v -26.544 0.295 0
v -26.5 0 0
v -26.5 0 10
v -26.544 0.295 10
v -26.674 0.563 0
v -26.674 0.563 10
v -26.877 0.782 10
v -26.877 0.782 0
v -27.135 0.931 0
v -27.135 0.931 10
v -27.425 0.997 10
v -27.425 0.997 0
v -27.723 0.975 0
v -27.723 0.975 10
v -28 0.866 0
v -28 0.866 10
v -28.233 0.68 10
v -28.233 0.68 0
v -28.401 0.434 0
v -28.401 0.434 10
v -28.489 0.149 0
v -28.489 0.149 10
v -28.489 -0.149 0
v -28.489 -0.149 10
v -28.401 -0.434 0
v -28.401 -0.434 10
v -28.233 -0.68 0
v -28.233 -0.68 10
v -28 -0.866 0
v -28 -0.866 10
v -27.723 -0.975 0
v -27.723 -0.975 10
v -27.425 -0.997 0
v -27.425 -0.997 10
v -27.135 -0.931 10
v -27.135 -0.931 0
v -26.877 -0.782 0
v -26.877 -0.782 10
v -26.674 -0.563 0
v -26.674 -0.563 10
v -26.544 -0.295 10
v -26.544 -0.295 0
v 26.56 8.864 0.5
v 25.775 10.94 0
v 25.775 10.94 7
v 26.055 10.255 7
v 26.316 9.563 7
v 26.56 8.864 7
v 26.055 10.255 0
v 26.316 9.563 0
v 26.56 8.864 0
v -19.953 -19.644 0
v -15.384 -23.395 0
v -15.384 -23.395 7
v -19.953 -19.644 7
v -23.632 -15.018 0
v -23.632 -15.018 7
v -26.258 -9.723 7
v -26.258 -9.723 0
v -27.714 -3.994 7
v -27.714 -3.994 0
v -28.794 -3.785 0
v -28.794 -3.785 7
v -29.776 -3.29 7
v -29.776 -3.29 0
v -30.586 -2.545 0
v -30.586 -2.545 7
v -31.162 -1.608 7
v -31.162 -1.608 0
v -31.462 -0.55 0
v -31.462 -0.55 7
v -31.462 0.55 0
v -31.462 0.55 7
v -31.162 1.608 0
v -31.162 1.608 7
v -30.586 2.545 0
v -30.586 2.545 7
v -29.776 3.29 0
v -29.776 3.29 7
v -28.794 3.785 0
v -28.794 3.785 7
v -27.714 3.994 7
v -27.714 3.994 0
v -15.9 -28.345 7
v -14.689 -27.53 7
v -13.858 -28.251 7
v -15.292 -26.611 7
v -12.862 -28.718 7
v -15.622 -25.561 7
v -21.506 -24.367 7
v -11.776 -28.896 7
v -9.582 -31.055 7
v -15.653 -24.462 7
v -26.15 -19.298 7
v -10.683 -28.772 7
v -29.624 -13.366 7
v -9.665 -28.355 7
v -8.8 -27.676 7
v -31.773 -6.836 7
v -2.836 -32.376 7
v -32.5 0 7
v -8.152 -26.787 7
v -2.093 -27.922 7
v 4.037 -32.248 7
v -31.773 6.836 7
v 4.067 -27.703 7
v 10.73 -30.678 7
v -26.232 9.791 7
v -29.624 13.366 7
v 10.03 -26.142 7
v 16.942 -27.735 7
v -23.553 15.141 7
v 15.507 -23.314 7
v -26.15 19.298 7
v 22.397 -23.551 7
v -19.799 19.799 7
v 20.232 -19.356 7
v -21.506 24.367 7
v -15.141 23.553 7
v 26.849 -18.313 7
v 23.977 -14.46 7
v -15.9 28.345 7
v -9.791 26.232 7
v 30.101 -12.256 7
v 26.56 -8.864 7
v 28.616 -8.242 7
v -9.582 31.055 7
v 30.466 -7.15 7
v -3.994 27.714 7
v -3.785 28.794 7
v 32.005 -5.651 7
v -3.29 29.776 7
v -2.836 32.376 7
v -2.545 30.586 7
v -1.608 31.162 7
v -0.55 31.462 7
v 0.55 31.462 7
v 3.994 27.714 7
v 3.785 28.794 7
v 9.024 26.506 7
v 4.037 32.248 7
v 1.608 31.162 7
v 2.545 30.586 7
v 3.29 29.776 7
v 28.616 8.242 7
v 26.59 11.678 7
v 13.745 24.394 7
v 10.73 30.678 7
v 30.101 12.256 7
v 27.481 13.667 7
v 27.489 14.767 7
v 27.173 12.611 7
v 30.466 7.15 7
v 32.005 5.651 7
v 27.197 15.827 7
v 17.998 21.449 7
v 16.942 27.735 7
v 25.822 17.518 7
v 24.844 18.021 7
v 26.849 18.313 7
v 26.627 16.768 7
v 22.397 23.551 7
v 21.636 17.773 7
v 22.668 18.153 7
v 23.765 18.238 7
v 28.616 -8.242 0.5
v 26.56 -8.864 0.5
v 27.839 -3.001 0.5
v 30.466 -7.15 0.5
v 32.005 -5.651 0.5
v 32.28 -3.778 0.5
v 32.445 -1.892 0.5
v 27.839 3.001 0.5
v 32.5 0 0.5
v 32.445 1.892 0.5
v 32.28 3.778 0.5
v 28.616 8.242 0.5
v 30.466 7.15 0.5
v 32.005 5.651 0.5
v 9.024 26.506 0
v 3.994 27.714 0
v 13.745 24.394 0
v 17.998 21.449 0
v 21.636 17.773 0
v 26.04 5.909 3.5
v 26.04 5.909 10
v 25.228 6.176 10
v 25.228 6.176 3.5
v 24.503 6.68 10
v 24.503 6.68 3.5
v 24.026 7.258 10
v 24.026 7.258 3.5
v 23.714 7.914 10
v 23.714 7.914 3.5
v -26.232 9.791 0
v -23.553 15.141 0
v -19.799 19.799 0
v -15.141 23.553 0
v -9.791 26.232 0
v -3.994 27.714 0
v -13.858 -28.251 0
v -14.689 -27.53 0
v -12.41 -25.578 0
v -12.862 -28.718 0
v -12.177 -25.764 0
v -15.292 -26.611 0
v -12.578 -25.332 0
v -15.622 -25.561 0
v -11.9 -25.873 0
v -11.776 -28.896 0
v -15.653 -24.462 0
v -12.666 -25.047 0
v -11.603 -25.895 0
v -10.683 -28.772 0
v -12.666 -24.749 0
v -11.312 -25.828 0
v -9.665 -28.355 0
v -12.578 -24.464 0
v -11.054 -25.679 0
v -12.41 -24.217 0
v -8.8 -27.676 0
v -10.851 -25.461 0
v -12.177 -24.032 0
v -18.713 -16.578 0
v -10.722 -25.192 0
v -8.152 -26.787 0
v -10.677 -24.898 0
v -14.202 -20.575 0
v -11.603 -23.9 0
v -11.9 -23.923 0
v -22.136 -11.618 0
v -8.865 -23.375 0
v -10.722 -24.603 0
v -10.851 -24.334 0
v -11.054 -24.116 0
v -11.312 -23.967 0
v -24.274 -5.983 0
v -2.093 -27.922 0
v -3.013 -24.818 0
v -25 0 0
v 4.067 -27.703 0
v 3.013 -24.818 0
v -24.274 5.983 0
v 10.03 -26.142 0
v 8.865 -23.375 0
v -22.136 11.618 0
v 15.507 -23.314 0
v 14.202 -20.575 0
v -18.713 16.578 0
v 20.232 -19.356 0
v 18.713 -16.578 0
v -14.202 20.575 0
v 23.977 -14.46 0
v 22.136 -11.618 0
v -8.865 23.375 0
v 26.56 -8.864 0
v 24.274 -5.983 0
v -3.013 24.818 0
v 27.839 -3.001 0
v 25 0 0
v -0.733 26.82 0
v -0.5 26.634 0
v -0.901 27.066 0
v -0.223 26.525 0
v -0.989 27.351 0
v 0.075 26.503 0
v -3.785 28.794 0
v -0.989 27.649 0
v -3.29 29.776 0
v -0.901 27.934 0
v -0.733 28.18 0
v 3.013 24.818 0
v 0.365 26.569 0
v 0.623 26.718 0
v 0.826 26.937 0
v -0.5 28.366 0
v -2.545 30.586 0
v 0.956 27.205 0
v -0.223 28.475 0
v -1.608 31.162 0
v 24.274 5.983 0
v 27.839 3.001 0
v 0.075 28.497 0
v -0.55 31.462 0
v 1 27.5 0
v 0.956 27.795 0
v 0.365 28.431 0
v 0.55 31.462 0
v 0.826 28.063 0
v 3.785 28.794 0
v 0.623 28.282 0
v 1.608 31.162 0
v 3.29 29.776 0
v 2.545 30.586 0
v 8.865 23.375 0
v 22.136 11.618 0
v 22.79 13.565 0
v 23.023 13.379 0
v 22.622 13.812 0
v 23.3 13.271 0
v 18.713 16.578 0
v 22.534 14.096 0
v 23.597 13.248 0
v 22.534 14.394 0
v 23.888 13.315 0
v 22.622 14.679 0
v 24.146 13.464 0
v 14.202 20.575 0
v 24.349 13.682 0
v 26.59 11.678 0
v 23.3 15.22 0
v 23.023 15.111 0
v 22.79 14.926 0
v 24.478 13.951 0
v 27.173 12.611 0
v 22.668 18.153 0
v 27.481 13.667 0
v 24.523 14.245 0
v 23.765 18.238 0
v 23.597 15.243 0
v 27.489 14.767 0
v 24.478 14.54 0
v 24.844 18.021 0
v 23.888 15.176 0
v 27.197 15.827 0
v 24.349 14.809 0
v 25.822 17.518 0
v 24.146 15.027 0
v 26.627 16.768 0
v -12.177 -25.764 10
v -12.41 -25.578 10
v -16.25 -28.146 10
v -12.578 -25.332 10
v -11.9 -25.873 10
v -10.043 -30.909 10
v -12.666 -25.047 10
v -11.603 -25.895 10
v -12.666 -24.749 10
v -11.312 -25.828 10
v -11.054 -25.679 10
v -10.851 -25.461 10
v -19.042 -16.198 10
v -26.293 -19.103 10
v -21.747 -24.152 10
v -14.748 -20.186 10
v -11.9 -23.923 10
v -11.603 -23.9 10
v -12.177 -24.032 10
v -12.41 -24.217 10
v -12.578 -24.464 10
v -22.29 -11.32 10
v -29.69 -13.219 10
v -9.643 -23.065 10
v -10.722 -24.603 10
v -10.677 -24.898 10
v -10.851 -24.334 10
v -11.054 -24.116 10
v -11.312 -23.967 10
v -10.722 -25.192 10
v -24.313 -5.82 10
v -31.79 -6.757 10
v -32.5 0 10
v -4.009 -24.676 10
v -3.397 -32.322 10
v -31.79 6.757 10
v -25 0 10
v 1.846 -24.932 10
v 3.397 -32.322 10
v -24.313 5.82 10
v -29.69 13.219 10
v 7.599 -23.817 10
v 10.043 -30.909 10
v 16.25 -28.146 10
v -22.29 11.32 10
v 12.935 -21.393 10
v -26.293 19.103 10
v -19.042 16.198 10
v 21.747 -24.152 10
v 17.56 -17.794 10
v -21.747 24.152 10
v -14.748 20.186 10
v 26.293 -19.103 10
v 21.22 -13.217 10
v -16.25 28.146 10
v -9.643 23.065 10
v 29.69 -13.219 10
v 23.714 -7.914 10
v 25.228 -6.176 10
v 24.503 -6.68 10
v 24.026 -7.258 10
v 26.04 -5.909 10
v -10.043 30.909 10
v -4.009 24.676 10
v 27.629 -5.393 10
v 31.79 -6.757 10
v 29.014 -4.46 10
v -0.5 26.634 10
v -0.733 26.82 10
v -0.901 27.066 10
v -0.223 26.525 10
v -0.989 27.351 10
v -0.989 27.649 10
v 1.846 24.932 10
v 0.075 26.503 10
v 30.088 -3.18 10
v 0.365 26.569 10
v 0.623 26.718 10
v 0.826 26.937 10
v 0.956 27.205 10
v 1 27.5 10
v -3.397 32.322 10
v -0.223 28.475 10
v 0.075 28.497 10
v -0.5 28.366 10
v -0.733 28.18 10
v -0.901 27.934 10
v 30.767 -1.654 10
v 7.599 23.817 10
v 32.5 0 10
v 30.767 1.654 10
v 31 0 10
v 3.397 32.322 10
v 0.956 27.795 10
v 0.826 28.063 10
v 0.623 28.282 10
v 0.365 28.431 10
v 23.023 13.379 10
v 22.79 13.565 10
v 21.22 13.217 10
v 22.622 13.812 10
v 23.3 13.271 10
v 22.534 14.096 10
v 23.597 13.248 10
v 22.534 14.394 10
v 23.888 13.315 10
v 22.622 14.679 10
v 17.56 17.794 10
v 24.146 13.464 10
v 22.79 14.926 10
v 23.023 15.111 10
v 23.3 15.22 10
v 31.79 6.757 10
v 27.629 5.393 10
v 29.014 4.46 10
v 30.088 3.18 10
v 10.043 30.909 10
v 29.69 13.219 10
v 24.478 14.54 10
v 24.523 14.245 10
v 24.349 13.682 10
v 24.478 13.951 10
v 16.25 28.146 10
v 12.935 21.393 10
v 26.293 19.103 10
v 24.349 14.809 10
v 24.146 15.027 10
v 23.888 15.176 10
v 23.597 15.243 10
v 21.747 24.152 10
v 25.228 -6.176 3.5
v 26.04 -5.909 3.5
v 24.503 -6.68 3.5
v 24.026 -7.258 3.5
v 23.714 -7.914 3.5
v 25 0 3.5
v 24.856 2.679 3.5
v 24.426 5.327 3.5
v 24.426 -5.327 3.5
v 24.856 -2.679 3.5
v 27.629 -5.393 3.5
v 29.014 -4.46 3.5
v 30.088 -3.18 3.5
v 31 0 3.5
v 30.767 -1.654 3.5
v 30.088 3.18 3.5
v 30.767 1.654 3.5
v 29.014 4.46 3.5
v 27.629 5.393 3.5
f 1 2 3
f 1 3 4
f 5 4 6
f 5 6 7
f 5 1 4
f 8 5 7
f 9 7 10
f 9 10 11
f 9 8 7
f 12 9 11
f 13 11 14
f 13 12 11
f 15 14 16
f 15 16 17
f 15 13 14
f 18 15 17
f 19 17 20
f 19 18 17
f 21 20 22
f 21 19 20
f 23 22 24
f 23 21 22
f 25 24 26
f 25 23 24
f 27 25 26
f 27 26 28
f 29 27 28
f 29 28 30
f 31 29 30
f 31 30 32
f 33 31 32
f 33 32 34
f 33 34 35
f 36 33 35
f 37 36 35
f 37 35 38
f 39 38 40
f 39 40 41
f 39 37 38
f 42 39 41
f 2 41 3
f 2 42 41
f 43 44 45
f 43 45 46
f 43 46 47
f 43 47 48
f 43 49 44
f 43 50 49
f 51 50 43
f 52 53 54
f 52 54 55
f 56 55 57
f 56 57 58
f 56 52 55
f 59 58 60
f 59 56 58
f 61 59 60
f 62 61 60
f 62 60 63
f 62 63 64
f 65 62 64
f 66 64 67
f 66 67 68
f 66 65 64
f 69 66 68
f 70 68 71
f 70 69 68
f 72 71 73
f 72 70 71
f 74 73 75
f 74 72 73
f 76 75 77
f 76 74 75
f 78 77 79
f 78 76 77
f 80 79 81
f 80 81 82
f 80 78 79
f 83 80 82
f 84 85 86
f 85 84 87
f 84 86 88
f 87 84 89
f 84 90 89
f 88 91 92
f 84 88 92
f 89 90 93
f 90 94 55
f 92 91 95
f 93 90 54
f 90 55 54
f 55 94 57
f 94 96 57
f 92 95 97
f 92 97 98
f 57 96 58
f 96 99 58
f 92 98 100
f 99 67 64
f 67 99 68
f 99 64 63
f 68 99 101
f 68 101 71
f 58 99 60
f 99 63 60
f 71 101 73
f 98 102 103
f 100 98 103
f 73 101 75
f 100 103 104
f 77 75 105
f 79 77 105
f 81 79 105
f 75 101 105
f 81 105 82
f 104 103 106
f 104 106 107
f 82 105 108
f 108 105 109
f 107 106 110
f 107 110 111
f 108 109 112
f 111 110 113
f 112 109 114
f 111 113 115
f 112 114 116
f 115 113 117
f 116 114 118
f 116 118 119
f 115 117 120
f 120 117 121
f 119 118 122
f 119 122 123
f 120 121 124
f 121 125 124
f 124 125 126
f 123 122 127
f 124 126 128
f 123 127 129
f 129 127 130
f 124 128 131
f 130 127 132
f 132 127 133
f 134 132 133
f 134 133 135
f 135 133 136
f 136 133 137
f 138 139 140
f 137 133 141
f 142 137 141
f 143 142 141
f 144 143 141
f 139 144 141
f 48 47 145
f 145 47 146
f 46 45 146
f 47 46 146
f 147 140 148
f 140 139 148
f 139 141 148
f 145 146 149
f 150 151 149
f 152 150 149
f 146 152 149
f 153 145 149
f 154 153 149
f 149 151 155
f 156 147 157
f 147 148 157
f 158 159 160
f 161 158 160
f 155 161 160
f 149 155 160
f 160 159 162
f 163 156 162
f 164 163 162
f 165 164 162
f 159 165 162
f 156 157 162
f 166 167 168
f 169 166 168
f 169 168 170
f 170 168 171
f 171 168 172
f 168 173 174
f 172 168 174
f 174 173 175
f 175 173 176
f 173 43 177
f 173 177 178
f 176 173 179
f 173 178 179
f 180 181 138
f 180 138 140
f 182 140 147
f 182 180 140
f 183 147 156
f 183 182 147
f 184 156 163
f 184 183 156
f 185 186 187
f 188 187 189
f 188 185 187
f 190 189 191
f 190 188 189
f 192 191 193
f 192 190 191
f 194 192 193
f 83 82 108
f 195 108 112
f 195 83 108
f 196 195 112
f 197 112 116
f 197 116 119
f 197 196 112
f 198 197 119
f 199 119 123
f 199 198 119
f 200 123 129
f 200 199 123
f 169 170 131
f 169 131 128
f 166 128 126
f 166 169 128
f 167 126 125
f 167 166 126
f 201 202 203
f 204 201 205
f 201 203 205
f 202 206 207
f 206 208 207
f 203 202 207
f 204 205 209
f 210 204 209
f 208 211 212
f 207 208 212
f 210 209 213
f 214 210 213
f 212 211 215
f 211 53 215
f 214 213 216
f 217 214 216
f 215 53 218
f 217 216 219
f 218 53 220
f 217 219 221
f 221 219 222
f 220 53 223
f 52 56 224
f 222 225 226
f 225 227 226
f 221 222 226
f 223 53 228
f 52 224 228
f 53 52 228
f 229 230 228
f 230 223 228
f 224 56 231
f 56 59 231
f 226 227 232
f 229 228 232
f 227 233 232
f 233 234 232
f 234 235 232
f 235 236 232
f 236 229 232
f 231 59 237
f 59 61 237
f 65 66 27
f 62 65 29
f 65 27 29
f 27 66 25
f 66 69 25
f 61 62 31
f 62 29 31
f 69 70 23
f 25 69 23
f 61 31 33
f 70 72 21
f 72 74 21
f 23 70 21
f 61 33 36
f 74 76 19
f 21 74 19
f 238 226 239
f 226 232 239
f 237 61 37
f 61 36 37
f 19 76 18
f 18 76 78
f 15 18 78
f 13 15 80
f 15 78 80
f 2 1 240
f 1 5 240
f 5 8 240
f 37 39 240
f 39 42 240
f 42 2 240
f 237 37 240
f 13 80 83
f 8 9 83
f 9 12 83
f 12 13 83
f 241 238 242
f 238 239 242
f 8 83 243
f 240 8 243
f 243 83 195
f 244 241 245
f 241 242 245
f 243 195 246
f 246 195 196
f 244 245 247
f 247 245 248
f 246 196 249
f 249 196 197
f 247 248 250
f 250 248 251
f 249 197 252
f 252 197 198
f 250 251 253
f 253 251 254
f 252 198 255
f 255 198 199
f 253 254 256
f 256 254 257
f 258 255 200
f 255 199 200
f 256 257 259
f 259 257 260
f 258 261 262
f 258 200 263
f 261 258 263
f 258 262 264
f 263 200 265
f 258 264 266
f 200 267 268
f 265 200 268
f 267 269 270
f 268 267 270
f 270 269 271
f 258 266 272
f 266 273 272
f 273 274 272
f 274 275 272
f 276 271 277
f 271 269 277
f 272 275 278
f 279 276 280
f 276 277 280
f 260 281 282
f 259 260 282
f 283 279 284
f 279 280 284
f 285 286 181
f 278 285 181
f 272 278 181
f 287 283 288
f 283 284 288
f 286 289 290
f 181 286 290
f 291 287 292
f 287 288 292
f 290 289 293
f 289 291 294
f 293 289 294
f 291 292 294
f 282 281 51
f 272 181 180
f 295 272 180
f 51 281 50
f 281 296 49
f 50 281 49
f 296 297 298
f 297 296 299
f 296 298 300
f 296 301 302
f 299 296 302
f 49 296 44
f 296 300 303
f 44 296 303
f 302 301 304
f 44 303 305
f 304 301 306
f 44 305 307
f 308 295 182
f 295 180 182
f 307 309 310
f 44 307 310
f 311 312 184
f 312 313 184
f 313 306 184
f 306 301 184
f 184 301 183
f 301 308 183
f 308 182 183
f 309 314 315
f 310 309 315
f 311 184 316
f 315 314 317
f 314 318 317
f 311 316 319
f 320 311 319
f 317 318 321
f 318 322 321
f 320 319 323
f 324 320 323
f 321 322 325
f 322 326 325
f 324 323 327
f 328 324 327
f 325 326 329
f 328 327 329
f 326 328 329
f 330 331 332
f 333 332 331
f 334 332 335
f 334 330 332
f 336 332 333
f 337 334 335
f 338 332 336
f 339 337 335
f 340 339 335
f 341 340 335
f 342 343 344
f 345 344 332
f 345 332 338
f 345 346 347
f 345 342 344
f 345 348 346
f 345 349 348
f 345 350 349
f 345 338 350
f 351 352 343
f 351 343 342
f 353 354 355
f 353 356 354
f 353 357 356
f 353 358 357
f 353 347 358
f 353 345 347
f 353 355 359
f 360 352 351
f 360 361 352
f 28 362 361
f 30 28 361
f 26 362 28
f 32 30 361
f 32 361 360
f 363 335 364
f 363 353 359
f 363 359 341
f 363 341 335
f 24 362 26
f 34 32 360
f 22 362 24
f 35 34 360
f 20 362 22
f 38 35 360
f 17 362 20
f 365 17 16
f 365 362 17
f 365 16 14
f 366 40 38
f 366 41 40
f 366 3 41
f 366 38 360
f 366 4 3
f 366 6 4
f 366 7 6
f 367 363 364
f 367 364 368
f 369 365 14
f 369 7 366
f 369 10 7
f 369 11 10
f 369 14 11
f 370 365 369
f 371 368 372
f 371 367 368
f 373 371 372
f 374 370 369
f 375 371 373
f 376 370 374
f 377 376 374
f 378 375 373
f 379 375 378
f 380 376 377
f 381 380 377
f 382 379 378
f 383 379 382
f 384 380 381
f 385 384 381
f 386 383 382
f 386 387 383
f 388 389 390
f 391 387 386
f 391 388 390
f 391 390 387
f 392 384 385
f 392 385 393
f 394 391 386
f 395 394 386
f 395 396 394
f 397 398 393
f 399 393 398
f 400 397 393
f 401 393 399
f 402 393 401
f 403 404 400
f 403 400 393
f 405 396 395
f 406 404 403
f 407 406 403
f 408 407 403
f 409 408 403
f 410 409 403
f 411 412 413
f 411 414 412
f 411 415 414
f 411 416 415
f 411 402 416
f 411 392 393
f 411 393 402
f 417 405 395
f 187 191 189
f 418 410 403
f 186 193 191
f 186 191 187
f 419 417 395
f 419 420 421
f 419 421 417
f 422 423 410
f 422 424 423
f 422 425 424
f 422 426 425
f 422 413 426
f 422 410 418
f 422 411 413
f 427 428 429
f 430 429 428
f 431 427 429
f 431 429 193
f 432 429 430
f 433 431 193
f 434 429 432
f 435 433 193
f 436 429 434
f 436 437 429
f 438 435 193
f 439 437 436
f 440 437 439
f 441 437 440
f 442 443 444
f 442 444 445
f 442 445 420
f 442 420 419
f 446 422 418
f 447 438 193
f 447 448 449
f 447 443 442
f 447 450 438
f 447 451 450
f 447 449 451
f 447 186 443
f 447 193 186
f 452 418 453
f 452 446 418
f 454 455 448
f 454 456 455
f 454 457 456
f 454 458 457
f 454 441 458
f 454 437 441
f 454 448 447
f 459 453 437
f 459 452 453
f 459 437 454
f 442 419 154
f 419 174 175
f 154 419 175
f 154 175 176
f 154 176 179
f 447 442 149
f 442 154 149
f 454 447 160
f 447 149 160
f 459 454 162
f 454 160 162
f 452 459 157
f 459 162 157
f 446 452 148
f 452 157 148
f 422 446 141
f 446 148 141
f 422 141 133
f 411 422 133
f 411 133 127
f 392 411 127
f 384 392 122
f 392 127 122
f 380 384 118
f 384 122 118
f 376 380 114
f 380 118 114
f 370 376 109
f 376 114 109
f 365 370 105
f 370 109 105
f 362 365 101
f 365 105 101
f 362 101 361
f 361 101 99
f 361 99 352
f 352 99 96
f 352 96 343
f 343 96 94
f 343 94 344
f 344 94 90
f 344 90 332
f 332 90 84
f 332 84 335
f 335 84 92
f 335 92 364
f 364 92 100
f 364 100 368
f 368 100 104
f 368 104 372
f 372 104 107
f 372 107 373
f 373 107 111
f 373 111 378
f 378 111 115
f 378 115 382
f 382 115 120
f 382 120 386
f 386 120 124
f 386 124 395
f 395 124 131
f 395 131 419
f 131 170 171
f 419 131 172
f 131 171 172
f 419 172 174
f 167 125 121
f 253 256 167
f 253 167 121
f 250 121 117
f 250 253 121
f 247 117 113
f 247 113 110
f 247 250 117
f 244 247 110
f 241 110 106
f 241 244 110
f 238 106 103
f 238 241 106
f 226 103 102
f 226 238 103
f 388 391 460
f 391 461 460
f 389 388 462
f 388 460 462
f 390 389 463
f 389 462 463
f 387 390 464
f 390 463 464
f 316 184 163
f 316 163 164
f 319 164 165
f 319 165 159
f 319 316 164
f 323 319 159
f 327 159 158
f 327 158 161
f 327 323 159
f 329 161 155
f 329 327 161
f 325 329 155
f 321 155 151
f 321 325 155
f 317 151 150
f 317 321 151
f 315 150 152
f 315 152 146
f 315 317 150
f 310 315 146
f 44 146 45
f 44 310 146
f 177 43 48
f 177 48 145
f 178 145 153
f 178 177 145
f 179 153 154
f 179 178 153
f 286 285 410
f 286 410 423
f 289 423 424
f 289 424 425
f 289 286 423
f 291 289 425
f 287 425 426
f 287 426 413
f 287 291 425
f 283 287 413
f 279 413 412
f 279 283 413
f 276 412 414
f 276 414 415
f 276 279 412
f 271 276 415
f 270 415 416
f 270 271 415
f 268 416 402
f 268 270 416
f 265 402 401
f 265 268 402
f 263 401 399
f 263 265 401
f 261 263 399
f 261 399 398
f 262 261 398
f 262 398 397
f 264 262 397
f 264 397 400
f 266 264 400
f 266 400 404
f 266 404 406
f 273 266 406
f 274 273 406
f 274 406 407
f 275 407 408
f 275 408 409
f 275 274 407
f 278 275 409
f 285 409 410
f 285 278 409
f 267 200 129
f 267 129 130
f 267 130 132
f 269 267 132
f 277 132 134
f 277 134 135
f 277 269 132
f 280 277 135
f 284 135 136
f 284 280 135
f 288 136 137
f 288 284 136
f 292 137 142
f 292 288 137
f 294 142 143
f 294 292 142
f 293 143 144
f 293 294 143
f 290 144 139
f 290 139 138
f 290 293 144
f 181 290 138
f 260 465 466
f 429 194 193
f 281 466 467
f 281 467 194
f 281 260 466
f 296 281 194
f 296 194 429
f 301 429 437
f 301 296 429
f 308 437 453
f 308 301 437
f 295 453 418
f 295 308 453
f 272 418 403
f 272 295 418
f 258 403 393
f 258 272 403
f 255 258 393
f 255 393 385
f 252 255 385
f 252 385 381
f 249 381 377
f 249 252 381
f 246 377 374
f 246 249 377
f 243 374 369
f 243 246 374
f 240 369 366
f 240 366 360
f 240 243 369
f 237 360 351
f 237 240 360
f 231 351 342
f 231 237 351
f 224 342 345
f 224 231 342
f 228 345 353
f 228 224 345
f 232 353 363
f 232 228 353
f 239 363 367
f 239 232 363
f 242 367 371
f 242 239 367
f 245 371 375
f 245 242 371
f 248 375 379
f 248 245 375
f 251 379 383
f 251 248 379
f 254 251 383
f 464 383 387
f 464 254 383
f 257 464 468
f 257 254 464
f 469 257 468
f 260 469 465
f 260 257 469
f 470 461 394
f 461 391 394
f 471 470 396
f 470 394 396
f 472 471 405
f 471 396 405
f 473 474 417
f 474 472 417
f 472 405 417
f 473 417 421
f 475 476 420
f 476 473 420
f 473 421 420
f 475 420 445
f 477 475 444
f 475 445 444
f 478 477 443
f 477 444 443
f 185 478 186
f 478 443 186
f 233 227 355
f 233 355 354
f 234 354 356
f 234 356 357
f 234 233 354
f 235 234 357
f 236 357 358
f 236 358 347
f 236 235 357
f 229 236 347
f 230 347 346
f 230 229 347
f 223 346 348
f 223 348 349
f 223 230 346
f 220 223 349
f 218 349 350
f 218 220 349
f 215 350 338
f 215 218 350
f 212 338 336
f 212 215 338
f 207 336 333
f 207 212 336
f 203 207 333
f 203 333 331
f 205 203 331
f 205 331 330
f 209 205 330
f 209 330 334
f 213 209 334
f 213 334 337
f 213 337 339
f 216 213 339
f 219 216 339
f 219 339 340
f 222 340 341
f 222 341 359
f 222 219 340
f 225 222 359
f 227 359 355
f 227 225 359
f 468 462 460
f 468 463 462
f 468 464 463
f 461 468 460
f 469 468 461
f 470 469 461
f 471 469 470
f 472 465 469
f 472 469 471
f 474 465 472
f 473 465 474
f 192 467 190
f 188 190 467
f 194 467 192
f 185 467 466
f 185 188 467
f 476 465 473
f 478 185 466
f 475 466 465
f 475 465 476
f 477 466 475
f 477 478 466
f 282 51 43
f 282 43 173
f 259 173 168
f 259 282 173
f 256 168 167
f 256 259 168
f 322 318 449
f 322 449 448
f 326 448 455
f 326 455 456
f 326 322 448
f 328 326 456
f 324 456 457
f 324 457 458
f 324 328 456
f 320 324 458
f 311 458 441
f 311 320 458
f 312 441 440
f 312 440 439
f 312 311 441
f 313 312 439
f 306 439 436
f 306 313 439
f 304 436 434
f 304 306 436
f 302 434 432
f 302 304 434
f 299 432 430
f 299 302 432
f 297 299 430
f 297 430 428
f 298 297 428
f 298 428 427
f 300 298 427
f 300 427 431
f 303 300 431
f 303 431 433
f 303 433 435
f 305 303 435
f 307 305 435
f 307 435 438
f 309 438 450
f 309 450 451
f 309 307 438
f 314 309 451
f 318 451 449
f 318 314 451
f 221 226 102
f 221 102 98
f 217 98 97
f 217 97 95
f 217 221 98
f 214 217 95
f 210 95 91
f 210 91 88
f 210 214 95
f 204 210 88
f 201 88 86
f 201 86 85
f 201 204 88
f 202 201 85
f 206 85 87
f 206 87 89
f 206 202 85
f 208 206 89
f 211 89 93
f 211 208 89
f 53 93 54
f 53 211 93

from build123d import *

# Parameters (mm, degrees)
SKETCH1_R                = 32.5
SKETCH1_R_2              = 25
SKETCH1_R_3              = 1
RING_BODY_DEPTH          = 10
SKETCH2_R                = 6
NUB_CUT_DEPTH            = 6.5
NUB_CUT_FILLETS_3MM_R    = 3
WEIGHT_REDUCTION_DEPTH   = 7
WEIGHT_REDUCTION_2_DEPTH = 0.5


# Read off the part's stored shape, not the designer's step: Weight reduction
with BuildPart() as part:
    # Sketch1 → Ring body (new body)
    with BuildSketch(Plane.XY):
        Circle(SKETCH1_R)
        Circle(SKETCH1_R_2, mode=Mode.SUBTRACT)
        with Locations((0, 27.5)):
            Circle(SKETCH1_R_3, mode=Mode.SUBTRACT)
        with Locations((23.5226917, 14.245454545)):
            Circle(SKETCH1_R_3, mode=Mode.SUBTRACT)
        with Locations((-27.5, 0)):
            Circle(SKETCH1_R_3, mode=Mode.SUBTRACT)
        with Locations((-11.677272727, -24.897616385)):
            Circle(SKETCH1_R_3, mode=Mode.SUBTRACT)
    extrude(amount=RING_BODY_DEPTH)

    # Sketch2 → Nub cut (cut)
    with BuildSketch(Plane.XY.offset(10)):
        with Locations((25, 0)):
            Circle(SKETCH2_R)
    extrude(amount=-NUB_CUT_DEPTH, mode=Mode.SUBTRACT)

    # Nub cut fillets 3mm
    nub_cut_fillets_3mm_edges = [part.edges().sort_by_distance(p)[0] for p in [
        (24.28, 5.95664335, 6.75),
        (24.28, -5.95664335, 6.75),
    ]]
    fillet(nub_cut_fillets_3mm_edges, radius=NUB_CUT_FILLETS_3MM_R)

    # Weight reduction outline → Weight reduction (cut)
    with BuildSketch(Plane.XY):
        with BuildLine():
            ThreePointArc((32.005, -5.650661466), (29.573928418, -7.751075978), (26.56, -8.86376895))
            ThreePointArc((26.56, -8.86376895), (12.846329016, -24.879144495), (-8.151686125, -26.787124021))
            ThreePointArc((-8.151686125, -26.787124021), (-13.375785124, -28.519087859), (-15.384291336, -23.394947747))
            ThreePointArc((-15.384291336, -23.394947747), (-23.631635891, -15.018181818), (-27.713636364, -3.994290864))
            ThreePointArc((-27.713636364, -3.994290864), (-31.5, 0), (-27.713636364, 3.994290864))
            ThreePointArc((-27.713636364, 3.994290864), (-19.798989873, 19.798989873), (-3.994290864, 27.713636364))
            ThreePointArc((-3.994290864, 27.713636364), (0, 31.5), (3.994290864, 27.713636364))
            ThreePointArc((3.994290864, 27.713636364), (13.745454545, 24.393902503), (21.636321277, 17.772720715))
            ThreePointArc((21.636321277, 17.772720715), (26.944174129, 16.317520661), (25.774538654, 10.939522711))
            ThreePointArc((25.774538654, 10.939522711), (26.187843982, 9.909431242), (26.56, 8.86376895))
            ThreePointArc((26.56, 8.86376895), (29.573928418, 7.751075978), (32.005, 5.650661466))
            ThreePointArc((32.005, 5.650661466), (-32.5, 0), (32.005, -5.650661466))
        make_face()
    extrude(amount=WEIGHT_REDUCTION_DEPTH, mode=Mode.SUBTRACT)

    # Weight reduction 2 outline → Weight reduction 2 (cut)
    with BuildSketch(Plane.XY):
        with BuildLine():
            ThreePointArc((26.56, 8.86376895), (28, 0), (26.56, -8.86376895))
            ThreePointArc((26.56, -8.86376895), (29.573928418, -7.751075978), (32.005, -5.650661466))
            ThreePointArc((32.005, -5.650661466), (32.5, 0), (32.005, 5.650661466))
            ThreePointArc((32.005, 5.650661466), (29.573928418, 7.751075978), (26.56, 8.86376895))
        make_face()
    extrude(amount=WEIGHT_REDUCTION_2_DEPTH, mode=Mode.SUBTRACT)


solid = part.part
